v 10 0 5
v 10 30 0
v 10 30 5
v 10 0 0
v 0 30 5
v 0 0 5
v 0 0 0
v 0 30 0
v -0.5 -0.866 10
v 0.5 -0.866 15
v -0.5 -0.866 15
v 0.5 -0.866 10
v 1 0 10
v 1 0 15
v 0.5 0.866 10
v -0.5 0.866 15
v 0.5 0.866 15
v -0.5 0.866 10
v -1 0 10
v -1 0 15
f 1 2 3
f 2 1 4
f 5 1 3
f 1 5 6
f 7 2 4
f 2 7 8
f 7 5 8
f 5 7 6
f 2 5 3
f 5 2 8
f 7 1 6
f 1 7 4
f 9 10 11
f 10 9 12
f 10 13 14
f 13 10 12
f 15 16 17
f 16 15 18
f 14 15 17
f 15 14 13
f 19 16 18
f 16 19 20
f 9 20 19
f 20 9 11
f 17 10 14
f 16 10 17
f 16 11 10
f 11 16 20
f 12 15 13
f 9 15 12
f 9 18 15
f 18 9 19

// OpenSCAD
module polyhole(h, d) {
    n = max(round(2 * d),3);
    rotate([0,0,180])
        cylinder(h = h, r = (d / 2) / cos (180 / n), $fn = n);
}

x=10;
y=30;
z=5;
explode=true;
if (explode)
{
cube(size = [x,y,z], center = false);
translate([0,0,10]) {color([1,1,0]); cylinder(h = z, r = 1, $fn = 6);}
}
